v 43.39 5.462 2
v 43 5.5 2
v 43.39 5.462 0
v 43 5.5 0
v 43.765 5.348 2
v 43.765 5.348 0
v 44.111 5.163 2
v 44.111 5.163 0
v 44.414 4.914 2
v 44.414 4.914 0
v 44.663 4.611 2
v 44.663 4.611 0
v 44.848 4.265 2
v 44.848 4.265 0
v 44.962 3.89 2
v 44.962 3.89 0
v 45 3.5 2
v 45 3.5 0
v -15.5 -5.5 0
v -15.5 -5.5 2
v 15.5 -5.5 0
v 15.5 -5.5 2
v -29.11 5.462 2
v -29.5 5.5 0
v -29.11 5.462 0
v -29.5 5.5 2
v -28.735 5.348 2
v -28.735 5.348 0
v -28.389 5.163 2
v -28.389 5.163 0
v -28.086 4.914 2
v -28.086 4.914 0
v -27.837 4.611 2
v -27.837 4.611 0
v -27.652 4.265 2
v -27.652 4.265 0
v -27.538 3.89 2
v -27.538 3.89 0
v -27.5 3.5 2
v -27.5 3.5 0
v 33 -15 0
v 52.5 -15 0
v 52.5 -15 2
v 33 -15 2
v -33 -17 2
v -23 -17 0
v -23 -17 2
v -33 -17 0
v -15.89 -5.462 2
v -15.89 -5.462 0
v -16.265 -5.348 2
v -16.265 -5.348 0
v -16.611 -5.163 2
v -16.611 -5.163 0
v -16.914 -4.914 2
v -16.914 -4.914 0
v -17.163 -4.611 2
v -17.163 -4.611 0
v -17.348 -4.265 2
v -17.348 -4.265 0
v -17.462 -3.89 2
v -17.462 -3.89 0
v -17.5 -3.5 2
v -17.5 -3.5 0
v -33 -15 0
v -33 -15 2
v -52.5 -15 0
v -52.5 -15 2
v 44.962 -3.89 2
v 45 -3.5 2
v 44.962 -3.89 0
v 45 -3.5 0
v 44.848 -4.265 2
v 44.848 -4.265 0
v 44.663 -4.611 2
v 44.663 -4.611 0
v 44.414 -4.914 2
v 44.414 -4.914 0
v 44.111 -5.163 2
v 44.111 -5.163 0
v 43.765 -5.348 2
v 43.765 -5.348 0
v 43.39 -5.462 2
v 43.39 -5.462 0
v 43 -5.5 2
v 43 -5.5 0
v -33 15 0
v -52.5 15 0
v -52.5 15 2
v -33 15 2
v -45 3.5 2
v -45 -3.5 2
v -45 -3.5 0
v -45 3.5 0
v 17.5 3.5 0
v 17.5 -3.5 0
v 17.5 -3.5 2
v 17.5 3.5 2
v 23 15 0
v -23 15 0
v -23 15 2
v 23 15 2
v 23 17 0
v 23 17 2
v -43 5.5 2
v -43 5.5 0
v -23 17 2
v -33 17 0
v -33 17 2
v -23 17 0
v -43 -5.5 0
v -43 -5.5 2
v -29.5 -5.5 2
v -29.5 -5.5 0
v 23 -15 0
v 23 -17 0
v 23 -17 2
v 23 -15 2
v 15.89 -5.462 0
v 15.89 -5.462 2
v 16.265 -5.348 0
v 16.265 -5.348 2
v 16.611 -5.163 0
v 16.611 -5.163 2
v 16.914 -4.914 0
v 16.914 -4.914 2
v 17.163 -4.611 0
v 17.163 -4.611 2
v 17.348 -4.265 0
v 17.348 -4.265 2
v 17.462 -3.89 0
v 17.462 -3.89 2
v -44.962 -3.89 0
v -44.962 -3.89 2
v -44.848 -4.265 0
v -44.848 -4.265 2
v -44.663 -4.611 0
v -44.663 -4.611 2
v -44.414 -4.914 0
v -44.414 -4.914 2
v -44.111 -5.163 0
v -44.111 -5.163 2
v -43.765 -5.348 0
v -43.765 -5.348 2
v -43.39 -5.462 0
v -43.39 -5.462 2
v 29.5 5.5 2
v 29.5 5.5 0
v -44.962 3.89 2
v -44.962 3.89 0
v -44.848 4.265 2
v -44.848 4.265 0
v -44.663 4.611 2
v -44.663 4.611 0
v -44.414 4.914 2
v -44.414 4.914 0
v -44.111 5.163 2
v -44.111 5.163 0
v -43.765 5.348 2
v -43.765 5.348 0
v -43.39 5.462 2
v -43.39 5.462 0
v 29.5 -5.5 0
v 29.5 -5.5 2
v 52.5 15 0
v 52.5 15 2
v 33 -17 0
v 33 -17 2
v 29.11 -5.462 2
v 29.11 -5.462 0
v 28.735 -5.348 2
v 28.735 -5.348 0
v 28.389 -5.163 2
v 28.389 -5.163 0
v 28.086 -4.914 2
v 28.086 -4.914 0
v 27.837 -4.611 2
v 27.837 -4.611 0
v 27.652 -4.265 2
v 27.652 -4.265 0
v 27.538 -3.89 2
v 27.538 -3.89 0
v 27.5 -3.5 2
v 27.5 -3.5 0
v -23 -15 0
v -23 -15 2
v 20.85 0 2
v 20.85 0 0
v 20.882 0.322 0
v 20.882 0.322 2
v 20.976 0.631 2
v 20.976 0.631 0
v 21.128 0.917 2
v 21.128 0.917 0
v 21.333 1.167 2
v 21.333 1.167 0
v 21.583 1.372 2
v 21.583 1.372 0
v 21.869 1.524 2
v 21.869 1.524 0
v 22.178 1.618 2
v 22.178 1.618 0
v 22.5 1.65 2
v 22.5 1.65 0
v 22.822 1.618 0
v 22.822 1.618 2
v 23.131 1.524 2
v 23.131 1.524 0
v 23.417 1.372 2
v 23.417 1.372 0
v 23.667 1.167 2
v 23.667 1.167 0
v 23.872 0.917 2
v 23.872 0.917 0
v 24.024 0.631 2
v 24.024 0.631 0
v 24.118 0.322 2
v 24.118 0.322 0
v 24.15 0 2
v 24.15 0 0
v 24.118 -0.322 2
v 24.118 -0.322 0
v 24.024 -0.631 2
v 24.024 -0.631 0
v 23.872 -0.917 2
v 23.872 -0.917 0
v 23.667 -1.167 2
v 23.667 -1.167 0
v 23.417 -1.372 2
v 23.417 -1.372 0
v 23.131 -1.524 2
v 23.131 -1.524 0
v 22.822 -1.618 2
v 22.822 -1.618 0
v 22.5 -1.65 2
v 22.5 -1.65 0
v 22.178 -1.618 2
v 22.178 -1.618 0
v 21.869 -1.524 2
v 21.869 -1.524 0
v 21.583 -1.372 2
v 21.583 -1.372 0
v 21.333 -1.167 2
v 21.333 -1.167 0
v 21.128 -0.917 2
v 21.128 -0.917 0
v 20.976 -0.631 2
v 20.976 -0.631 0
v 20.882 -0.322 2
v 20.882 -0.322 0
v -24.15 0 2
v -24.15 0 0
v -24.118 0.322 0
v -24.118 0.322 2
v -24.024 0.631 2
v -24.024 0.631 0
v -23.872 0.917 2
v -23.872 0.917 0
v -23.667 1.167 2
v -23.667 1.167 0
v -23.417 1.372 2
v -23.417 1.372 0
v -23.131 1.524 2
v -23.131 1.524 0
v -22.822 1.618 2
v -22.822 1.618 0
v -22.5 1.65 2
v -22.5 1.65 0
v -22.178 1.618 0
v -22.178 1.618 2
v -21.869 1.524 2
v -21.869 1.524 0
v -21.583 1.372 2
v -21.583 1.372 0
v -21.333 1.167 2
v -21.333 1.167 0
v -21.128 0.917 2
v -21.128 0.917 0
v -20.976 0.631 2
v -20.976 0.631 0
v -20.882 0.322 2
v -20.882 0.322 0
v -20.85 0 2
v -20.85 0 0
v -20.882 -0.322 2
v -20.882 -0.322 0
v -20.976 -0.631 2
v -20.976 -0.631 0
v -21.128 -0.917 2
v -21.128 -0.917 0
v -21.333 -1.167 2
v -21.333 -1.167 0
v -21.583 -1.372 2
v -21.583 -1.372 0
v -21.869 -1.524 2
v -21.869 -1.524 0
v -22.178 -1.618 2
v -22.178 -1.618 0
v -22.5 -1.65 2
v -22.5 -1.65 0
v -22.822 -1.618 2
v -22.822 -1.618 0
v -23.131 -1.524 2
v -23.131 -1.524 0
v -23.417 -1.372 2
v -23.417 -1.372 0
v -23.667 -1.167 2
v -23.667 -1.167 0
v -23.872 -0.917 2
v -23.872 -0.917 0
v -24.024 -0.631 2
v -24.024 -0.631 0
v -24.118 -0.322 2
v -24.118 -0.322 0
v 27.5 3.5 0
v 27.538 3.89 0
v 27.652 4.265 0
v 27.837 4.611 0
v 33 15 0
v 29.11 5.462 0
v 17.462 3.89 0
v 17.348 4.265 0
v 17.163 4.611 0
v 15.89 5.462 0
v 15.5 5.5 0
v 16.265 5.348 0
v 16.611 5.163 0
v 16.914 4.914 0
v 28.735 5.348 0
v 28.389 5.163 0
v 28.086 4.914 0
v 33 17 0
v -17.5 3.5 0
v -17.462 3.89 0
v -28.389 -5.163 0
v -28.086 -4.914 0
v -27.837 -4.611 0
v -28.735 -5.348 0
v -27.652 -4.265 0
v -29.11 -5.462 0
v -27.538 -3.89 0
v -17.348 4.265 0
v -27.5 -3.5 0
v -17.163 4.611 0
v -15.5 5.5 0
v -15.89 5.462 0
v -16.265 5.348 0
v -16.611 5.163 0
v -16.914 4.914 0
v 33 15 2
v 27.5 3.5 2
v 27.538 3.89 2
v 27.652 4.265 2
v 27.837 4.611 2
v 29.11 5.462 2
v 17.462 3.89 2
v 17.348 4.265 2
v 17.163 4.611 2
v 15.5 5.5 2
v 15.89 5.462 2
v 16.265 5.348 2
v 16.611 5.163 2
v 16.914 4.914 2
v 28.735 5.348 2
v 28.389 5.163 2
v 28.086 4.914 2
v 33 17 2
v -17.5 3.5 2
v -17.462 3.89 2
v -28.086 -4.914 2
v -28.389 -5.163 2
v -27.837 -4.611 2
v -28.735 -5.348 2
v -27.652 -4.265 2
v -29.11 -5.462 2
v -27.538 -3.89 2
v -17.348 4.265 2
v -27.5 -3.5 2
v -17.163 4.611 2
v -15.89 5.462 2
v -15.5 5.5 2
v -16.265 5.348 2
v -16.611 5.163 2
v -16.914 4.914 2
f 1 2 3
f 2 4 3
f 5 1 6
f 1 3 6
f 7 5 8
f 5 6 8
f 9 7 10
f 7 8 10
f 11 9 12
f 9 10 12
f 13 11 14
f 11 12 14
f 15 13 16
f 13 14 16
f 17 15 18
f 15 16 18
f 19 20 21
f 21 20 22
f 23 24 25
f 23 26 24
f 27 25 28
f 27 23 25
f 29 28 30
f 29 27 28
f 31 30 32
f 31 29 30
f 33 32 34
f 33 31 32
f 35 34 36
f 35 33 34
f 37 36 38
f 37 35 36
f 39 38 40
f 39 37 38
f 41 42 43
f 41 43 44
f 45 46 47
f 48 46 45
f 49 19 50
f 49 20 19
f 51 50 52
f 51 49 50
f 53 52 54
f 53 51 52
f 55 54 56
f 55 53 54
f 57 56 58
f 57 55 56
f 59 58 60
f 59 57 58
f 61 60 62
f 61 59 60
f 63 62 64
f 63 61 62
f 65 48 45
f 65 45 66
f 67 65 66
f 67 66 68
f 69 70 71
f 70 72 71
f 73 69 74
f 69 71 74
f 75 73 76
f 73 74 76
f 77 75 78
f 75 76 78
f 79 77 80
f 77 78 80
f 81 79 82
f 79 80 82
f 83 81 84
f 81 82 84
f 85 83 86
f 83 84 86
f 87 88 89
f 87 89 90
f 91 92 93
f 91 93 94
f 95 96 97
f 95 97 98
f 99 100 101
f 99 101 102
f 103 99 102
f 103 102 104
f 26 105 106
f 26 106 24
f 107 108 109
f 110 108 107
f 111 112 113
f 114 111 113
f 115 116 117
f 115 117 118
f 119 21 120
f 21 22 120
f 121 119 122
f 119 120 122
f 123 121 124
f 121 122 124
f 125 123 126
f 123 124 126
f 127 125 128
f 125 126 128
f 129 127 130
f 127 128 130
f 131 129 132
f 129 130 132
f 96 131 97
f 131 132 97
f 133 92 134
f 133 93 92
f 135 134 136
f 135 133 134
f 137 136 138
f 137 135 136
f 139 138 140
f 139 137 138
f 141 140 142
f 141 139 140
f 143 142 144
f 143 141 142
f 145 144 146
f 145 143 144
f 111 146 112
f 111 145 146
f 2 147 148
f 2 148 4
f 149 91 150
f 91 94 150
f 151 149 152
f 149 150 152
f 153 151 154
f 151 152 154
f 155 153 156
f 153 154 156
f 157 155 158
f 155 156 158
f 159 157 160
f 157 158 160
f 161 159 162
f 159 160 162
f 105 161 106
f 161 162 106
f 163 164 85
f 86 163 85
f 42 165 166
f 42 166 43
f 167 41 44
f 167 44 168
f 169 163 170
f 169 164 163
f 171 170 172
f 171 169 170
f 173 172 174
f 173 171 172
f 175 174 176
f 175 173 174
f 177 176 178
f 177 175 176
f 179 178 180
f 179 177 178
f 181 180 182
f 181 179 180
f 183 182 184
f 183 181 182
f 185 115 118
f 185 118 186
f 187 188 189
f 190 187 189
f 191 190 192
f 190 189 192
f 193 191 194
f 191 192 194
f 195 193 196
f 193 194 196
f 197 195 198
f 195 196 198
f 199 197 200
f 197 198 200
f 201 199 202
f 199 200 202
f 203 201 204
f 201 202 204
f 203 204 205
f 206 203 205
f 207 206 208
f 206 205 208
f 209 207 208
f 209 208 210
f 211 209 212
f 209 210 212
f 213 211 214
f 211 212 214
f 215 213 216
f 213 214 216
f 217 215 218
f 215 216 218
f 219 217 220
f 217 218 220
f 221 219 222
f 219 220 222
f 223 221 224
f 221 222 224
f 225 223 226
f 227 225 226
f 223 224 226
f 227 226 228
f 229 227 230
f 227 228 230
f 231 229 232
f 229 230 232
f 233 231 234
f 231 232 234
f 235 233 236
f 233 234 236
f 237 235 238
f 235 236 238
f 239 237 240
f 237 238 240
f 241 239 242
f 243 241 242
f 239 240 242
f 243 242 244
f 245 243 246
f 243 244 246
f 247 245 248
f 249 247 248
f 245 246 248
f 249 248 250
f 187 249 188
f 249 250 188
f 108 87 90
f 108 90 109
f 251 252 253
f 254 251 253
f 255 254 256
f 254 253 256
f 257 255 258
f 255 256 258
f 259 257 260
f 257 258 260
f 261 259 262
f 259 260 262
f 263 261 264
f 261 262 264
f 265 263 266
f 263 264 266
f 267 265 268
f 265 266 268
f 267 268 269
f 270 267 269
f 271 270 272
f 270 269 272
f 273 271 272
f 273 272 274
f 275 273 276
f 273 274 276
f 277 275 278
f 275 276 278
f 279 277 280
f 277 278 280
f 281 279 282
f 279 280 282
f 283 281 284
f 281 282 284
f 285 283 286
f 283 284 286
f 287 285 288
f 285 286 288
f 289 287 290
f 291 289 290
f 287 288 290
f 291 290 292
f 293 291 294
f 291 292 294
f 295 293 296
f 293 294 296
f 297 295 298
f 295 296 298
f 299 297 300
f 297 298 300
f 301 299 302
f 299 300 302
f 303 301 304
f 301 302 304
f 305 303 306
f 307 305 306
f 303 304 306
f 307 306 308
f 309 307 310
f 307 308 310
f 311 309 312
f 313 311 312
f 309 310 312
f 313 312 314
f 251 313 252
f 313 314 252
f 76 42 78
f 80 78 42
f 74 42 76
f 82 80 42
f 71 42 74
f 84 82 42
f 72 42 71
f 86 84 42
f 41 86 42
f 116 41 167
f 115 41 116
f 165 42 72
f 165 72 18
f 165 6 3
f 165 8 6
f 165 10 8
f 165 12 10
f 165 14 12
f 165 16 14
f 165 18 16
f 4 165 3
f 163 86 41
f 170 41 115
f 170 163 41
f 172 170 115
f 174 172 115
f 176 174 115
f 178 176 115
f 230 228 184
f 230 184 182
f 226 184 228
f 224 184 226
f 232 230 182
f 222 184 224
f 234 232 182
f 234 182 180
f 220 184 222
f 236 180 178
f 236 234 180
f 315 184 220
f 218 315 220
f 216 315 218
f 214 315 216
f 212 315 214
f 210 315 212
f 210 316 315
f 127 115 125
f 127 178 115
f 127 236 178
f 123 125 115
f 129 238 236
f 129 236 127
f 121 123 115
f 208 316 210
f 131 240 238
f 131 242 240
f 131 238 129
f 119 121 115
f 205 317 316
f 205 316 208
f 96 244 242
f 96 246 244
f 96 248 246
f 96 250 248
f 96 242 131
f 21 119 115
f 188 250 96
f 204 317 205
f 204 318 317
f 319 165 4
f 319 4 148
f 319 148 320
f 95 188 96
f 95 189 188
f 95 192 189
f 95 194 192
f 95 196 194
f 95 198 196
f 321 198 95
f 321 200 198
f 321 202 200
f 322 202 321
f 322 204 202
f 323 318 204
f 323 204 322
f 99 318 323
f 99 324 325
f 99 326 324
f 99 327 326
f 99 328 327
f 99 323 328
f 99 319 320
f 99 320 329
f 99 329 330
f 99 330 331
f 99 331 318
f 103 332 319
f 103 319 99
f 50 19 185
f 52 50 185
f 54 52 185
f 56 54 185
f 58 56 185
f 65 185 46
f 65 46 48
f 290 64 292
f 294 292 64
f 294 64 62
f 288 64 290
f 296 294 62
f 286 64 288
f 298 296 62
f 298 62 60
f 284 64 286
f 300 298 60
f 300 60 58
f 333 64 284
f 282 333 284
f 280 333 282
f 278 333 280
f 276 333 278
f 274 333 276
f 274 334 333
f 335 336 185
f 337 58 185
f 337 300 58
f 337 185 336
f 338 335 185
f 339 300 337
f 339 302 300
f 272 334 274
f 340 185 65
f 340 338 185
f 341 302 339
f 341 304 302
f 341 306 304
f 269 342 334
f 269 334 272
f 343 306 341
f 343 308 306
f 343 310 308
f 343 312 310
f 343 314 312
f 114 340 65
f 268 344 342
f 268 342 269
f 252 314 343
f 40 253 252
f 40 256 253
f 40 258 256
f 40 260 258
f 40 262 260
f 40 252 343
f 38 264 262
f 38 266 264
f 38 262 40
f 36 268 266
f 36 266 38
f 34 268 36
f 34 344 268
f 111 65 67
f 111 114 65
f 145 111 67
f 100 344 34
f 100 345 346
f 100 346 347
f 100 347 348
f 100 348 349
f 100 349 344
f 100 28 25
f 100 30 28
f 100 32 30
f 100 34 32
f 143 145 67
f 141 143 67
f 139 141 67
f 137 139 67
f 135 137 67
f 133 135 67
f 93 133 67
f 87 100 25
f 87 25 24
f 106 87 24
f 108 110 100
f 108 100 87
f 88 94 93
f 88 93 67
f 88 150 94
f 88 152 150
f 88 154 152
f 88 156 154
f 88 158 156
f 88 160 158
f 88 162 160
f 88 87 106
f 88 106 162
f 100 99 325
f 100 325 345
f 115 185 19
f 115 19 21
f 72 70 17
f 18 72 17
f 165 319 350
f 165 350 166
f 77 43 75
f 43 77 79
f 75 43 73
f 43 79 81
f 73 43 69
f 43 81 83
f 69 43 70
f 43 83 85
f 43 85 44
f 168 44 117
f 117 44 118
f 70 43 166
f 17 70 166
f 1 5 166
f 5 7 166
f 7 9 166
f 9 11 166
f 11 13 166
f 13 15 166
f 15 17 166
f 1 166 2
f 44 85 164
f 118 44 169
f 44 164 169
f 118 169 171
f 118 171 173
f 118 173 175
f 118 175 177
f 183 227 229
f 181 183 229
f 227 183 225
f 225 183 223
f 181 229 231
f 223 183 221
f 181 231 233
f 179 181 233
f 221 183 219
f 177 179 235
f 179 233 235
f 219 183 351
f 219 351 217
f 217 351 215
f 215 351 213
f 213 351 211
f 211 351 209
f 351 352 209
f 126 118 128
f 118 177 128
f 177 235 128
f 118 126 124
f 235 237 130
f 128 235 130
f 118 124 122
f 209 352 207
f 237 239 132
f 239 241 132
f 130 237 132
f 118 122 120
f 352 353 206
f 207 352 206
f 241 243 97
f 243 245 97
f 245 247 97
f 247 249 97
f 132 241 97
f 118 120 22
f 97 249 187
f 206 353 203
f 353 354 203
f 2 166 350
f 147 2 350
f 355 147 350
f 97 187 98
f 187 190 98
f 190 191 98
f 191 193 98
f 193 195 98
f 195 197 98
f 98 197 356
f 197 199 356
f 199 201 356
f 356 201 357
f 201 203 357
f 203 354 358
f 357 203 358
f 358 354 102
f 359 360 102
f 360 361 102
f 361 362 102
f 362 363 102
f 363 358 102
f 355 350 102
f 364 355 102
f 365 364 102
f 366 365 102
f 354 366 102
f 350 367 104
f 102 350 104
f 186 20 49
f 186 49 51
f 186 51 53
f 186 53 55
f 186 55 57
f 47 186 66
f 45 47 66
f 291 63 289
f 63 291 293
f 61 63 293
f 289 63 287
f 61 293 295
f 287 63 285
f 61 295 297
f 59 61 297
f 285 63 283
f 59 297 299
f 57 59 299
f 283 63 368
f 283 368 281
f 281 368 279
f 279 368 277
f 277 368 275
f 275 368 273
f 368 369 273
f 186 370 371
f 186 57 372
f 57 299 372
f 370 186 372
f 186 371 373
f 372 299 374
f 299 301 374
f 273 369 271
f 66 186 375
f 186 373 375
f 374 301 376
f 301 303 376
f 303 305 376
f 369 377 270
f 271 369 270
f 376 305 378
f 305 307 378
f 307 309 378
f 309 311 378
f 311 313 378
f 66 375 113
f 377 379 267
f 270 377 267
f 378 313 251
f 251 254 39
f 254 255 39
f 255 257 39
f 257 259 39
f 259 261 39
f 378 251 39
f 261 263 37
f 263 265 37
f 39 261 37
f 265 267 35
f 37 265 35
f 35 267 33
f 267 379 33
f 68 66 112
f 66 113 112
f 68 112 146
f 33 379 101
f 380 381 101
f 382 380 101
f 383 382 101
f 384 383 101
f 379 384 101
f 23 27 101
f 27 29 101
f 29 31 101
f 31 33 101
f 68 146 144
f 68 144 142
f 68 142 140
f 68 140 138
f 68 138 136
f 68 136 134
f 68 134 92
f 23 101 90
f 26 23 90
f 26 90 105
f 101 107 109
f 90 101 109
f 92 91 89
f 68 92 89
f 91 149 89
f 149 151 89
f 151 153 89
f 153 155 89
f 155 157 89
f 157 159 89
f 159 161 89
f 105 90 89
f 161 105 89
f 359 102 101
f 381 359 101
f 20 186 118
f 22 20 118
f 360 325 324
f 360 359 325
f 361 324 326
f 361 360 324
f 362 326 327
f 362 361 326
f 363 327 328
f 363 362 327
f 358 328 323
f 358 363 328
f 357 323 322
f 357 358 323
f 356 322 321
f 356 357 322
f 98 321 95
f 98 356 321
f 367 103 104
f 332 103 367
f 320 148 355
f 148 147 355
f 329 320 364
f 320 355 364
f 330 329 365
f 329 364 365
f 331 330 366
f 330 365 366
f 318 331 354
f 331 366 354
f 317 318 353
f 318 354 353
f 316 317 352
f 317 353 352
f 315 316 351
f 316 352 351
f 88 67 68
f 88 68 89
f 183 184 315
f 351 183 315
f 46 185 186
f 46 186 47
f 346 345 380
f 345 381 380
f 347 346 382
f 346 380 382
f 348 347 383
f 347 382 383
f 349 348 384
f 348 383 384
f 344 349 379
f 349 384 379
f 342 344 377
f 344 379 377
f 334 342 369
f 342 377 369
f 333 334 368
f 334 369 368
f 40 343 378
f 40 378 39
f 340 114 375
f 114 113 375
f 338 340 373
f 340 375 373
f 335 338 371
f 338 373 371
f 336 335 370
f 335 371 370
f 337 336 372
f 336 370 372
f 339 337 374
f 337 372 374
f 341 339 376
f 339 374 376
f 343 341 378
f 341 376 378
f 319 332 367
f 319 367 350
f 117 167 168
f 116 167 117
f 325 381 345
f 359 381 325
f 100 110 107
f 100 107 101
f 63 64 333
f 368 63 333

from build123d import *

# Parameters (mm, degrees)
EXTRUDE_1_DEPTH     = 2
SKETCH_2_W          = 90
SKETCH_2_H          = 11
CUT_EXTRUDE_1_DEPTH = 2
SKETCH_4_W          = 10
SKETCH_4_H          = 11
SKETCH_4_R          = 1.65
EXTRUDE_3_DEPTH     = 2
FILLET_2_R          = 2


with BuildPart() as part:
    # 草图1 → 凸台-拉伸1 (new body)
    with BuildSketch(Plane.XY):
        Polygon((-33, -15), (-52.5, -15), (-52.5, 15), (-33, 15), (-33, 17), (-23, 17), (-23, 15), (23, 15), (23, 17), (33, 17), (33, 15), (52.5, 15), (52.5, -15), (33, -15), (33, -17), (23, -17), (23, -15), (-23, -15), (-23, -17), (-33, -17), align=None)
    extrude(amount=EXTRUDE_1_DEPTH)

    # 草图2 → 切除-拉伸1 (cut)
    with BuildSketch(Plane.XY.offset(2)):
        Rectangle(SKETCH_2_W, SKETCH_2_H)
    extrude(amount=-CUT_EXTRUDE_1_DEPTH, mode=Mode.SUBTRACT)

    # 草图4 → 凸台-拉伸3 (add)
    # profile 1 of 2: a face of its own
    with BuildSketch(Plane(origin=(0, 0, 0), x_dir=(-1, 0, 0), z_dir=(0, 0, -1))):
        with Locations((-22.5, 0)):
            Rectangle(SKETCH_4_W, SKETCH_4_H)
        with Locations((-22.5, 0)):
            Circle(SKETCH_4_R, mode=Mode.SUBTRACT)
    # profile 2 of 2: a face of its own
    with BuildSketch(Plane(origin=(0, 0, 0), x_dir=(-1, 0, 0), z_dir=(0, 0, -1))):
        with Locations((22.5, 0)):
            Rectangle(SKETCH_4_W, SKETCH_4_H)
        with Locations((22.5, 0)):
            Circle(SKETCH_4_R, mode=Mode.SUBTRACT)
    extrude(amount=-EXTRUDE_3_DEPTH)

    # 圆角2
    fillet_2_edges = [part.edges().sort_by_distance(p)[0] for p in [
        (-45, -5.5, 1),
        (-45, 5.5, 1),
        (45, 5.5, 1),
        (45, -5.5, 1),
        (17.5, -5.5, 1),
        (17.5, 5.5, 1),
        (27.5, 5.5, 1),
        (27.5, -5.5, 1),
        (-27.5, -5.5, 1),
        (-27.5, 5.5, 1),
        (-17.5, 5.5, 1),
        (-17.5, -5.5, 1),
    ]]
    fillet(fillet_2_edges, radius=FILLET_2_R)


solid = part.part
